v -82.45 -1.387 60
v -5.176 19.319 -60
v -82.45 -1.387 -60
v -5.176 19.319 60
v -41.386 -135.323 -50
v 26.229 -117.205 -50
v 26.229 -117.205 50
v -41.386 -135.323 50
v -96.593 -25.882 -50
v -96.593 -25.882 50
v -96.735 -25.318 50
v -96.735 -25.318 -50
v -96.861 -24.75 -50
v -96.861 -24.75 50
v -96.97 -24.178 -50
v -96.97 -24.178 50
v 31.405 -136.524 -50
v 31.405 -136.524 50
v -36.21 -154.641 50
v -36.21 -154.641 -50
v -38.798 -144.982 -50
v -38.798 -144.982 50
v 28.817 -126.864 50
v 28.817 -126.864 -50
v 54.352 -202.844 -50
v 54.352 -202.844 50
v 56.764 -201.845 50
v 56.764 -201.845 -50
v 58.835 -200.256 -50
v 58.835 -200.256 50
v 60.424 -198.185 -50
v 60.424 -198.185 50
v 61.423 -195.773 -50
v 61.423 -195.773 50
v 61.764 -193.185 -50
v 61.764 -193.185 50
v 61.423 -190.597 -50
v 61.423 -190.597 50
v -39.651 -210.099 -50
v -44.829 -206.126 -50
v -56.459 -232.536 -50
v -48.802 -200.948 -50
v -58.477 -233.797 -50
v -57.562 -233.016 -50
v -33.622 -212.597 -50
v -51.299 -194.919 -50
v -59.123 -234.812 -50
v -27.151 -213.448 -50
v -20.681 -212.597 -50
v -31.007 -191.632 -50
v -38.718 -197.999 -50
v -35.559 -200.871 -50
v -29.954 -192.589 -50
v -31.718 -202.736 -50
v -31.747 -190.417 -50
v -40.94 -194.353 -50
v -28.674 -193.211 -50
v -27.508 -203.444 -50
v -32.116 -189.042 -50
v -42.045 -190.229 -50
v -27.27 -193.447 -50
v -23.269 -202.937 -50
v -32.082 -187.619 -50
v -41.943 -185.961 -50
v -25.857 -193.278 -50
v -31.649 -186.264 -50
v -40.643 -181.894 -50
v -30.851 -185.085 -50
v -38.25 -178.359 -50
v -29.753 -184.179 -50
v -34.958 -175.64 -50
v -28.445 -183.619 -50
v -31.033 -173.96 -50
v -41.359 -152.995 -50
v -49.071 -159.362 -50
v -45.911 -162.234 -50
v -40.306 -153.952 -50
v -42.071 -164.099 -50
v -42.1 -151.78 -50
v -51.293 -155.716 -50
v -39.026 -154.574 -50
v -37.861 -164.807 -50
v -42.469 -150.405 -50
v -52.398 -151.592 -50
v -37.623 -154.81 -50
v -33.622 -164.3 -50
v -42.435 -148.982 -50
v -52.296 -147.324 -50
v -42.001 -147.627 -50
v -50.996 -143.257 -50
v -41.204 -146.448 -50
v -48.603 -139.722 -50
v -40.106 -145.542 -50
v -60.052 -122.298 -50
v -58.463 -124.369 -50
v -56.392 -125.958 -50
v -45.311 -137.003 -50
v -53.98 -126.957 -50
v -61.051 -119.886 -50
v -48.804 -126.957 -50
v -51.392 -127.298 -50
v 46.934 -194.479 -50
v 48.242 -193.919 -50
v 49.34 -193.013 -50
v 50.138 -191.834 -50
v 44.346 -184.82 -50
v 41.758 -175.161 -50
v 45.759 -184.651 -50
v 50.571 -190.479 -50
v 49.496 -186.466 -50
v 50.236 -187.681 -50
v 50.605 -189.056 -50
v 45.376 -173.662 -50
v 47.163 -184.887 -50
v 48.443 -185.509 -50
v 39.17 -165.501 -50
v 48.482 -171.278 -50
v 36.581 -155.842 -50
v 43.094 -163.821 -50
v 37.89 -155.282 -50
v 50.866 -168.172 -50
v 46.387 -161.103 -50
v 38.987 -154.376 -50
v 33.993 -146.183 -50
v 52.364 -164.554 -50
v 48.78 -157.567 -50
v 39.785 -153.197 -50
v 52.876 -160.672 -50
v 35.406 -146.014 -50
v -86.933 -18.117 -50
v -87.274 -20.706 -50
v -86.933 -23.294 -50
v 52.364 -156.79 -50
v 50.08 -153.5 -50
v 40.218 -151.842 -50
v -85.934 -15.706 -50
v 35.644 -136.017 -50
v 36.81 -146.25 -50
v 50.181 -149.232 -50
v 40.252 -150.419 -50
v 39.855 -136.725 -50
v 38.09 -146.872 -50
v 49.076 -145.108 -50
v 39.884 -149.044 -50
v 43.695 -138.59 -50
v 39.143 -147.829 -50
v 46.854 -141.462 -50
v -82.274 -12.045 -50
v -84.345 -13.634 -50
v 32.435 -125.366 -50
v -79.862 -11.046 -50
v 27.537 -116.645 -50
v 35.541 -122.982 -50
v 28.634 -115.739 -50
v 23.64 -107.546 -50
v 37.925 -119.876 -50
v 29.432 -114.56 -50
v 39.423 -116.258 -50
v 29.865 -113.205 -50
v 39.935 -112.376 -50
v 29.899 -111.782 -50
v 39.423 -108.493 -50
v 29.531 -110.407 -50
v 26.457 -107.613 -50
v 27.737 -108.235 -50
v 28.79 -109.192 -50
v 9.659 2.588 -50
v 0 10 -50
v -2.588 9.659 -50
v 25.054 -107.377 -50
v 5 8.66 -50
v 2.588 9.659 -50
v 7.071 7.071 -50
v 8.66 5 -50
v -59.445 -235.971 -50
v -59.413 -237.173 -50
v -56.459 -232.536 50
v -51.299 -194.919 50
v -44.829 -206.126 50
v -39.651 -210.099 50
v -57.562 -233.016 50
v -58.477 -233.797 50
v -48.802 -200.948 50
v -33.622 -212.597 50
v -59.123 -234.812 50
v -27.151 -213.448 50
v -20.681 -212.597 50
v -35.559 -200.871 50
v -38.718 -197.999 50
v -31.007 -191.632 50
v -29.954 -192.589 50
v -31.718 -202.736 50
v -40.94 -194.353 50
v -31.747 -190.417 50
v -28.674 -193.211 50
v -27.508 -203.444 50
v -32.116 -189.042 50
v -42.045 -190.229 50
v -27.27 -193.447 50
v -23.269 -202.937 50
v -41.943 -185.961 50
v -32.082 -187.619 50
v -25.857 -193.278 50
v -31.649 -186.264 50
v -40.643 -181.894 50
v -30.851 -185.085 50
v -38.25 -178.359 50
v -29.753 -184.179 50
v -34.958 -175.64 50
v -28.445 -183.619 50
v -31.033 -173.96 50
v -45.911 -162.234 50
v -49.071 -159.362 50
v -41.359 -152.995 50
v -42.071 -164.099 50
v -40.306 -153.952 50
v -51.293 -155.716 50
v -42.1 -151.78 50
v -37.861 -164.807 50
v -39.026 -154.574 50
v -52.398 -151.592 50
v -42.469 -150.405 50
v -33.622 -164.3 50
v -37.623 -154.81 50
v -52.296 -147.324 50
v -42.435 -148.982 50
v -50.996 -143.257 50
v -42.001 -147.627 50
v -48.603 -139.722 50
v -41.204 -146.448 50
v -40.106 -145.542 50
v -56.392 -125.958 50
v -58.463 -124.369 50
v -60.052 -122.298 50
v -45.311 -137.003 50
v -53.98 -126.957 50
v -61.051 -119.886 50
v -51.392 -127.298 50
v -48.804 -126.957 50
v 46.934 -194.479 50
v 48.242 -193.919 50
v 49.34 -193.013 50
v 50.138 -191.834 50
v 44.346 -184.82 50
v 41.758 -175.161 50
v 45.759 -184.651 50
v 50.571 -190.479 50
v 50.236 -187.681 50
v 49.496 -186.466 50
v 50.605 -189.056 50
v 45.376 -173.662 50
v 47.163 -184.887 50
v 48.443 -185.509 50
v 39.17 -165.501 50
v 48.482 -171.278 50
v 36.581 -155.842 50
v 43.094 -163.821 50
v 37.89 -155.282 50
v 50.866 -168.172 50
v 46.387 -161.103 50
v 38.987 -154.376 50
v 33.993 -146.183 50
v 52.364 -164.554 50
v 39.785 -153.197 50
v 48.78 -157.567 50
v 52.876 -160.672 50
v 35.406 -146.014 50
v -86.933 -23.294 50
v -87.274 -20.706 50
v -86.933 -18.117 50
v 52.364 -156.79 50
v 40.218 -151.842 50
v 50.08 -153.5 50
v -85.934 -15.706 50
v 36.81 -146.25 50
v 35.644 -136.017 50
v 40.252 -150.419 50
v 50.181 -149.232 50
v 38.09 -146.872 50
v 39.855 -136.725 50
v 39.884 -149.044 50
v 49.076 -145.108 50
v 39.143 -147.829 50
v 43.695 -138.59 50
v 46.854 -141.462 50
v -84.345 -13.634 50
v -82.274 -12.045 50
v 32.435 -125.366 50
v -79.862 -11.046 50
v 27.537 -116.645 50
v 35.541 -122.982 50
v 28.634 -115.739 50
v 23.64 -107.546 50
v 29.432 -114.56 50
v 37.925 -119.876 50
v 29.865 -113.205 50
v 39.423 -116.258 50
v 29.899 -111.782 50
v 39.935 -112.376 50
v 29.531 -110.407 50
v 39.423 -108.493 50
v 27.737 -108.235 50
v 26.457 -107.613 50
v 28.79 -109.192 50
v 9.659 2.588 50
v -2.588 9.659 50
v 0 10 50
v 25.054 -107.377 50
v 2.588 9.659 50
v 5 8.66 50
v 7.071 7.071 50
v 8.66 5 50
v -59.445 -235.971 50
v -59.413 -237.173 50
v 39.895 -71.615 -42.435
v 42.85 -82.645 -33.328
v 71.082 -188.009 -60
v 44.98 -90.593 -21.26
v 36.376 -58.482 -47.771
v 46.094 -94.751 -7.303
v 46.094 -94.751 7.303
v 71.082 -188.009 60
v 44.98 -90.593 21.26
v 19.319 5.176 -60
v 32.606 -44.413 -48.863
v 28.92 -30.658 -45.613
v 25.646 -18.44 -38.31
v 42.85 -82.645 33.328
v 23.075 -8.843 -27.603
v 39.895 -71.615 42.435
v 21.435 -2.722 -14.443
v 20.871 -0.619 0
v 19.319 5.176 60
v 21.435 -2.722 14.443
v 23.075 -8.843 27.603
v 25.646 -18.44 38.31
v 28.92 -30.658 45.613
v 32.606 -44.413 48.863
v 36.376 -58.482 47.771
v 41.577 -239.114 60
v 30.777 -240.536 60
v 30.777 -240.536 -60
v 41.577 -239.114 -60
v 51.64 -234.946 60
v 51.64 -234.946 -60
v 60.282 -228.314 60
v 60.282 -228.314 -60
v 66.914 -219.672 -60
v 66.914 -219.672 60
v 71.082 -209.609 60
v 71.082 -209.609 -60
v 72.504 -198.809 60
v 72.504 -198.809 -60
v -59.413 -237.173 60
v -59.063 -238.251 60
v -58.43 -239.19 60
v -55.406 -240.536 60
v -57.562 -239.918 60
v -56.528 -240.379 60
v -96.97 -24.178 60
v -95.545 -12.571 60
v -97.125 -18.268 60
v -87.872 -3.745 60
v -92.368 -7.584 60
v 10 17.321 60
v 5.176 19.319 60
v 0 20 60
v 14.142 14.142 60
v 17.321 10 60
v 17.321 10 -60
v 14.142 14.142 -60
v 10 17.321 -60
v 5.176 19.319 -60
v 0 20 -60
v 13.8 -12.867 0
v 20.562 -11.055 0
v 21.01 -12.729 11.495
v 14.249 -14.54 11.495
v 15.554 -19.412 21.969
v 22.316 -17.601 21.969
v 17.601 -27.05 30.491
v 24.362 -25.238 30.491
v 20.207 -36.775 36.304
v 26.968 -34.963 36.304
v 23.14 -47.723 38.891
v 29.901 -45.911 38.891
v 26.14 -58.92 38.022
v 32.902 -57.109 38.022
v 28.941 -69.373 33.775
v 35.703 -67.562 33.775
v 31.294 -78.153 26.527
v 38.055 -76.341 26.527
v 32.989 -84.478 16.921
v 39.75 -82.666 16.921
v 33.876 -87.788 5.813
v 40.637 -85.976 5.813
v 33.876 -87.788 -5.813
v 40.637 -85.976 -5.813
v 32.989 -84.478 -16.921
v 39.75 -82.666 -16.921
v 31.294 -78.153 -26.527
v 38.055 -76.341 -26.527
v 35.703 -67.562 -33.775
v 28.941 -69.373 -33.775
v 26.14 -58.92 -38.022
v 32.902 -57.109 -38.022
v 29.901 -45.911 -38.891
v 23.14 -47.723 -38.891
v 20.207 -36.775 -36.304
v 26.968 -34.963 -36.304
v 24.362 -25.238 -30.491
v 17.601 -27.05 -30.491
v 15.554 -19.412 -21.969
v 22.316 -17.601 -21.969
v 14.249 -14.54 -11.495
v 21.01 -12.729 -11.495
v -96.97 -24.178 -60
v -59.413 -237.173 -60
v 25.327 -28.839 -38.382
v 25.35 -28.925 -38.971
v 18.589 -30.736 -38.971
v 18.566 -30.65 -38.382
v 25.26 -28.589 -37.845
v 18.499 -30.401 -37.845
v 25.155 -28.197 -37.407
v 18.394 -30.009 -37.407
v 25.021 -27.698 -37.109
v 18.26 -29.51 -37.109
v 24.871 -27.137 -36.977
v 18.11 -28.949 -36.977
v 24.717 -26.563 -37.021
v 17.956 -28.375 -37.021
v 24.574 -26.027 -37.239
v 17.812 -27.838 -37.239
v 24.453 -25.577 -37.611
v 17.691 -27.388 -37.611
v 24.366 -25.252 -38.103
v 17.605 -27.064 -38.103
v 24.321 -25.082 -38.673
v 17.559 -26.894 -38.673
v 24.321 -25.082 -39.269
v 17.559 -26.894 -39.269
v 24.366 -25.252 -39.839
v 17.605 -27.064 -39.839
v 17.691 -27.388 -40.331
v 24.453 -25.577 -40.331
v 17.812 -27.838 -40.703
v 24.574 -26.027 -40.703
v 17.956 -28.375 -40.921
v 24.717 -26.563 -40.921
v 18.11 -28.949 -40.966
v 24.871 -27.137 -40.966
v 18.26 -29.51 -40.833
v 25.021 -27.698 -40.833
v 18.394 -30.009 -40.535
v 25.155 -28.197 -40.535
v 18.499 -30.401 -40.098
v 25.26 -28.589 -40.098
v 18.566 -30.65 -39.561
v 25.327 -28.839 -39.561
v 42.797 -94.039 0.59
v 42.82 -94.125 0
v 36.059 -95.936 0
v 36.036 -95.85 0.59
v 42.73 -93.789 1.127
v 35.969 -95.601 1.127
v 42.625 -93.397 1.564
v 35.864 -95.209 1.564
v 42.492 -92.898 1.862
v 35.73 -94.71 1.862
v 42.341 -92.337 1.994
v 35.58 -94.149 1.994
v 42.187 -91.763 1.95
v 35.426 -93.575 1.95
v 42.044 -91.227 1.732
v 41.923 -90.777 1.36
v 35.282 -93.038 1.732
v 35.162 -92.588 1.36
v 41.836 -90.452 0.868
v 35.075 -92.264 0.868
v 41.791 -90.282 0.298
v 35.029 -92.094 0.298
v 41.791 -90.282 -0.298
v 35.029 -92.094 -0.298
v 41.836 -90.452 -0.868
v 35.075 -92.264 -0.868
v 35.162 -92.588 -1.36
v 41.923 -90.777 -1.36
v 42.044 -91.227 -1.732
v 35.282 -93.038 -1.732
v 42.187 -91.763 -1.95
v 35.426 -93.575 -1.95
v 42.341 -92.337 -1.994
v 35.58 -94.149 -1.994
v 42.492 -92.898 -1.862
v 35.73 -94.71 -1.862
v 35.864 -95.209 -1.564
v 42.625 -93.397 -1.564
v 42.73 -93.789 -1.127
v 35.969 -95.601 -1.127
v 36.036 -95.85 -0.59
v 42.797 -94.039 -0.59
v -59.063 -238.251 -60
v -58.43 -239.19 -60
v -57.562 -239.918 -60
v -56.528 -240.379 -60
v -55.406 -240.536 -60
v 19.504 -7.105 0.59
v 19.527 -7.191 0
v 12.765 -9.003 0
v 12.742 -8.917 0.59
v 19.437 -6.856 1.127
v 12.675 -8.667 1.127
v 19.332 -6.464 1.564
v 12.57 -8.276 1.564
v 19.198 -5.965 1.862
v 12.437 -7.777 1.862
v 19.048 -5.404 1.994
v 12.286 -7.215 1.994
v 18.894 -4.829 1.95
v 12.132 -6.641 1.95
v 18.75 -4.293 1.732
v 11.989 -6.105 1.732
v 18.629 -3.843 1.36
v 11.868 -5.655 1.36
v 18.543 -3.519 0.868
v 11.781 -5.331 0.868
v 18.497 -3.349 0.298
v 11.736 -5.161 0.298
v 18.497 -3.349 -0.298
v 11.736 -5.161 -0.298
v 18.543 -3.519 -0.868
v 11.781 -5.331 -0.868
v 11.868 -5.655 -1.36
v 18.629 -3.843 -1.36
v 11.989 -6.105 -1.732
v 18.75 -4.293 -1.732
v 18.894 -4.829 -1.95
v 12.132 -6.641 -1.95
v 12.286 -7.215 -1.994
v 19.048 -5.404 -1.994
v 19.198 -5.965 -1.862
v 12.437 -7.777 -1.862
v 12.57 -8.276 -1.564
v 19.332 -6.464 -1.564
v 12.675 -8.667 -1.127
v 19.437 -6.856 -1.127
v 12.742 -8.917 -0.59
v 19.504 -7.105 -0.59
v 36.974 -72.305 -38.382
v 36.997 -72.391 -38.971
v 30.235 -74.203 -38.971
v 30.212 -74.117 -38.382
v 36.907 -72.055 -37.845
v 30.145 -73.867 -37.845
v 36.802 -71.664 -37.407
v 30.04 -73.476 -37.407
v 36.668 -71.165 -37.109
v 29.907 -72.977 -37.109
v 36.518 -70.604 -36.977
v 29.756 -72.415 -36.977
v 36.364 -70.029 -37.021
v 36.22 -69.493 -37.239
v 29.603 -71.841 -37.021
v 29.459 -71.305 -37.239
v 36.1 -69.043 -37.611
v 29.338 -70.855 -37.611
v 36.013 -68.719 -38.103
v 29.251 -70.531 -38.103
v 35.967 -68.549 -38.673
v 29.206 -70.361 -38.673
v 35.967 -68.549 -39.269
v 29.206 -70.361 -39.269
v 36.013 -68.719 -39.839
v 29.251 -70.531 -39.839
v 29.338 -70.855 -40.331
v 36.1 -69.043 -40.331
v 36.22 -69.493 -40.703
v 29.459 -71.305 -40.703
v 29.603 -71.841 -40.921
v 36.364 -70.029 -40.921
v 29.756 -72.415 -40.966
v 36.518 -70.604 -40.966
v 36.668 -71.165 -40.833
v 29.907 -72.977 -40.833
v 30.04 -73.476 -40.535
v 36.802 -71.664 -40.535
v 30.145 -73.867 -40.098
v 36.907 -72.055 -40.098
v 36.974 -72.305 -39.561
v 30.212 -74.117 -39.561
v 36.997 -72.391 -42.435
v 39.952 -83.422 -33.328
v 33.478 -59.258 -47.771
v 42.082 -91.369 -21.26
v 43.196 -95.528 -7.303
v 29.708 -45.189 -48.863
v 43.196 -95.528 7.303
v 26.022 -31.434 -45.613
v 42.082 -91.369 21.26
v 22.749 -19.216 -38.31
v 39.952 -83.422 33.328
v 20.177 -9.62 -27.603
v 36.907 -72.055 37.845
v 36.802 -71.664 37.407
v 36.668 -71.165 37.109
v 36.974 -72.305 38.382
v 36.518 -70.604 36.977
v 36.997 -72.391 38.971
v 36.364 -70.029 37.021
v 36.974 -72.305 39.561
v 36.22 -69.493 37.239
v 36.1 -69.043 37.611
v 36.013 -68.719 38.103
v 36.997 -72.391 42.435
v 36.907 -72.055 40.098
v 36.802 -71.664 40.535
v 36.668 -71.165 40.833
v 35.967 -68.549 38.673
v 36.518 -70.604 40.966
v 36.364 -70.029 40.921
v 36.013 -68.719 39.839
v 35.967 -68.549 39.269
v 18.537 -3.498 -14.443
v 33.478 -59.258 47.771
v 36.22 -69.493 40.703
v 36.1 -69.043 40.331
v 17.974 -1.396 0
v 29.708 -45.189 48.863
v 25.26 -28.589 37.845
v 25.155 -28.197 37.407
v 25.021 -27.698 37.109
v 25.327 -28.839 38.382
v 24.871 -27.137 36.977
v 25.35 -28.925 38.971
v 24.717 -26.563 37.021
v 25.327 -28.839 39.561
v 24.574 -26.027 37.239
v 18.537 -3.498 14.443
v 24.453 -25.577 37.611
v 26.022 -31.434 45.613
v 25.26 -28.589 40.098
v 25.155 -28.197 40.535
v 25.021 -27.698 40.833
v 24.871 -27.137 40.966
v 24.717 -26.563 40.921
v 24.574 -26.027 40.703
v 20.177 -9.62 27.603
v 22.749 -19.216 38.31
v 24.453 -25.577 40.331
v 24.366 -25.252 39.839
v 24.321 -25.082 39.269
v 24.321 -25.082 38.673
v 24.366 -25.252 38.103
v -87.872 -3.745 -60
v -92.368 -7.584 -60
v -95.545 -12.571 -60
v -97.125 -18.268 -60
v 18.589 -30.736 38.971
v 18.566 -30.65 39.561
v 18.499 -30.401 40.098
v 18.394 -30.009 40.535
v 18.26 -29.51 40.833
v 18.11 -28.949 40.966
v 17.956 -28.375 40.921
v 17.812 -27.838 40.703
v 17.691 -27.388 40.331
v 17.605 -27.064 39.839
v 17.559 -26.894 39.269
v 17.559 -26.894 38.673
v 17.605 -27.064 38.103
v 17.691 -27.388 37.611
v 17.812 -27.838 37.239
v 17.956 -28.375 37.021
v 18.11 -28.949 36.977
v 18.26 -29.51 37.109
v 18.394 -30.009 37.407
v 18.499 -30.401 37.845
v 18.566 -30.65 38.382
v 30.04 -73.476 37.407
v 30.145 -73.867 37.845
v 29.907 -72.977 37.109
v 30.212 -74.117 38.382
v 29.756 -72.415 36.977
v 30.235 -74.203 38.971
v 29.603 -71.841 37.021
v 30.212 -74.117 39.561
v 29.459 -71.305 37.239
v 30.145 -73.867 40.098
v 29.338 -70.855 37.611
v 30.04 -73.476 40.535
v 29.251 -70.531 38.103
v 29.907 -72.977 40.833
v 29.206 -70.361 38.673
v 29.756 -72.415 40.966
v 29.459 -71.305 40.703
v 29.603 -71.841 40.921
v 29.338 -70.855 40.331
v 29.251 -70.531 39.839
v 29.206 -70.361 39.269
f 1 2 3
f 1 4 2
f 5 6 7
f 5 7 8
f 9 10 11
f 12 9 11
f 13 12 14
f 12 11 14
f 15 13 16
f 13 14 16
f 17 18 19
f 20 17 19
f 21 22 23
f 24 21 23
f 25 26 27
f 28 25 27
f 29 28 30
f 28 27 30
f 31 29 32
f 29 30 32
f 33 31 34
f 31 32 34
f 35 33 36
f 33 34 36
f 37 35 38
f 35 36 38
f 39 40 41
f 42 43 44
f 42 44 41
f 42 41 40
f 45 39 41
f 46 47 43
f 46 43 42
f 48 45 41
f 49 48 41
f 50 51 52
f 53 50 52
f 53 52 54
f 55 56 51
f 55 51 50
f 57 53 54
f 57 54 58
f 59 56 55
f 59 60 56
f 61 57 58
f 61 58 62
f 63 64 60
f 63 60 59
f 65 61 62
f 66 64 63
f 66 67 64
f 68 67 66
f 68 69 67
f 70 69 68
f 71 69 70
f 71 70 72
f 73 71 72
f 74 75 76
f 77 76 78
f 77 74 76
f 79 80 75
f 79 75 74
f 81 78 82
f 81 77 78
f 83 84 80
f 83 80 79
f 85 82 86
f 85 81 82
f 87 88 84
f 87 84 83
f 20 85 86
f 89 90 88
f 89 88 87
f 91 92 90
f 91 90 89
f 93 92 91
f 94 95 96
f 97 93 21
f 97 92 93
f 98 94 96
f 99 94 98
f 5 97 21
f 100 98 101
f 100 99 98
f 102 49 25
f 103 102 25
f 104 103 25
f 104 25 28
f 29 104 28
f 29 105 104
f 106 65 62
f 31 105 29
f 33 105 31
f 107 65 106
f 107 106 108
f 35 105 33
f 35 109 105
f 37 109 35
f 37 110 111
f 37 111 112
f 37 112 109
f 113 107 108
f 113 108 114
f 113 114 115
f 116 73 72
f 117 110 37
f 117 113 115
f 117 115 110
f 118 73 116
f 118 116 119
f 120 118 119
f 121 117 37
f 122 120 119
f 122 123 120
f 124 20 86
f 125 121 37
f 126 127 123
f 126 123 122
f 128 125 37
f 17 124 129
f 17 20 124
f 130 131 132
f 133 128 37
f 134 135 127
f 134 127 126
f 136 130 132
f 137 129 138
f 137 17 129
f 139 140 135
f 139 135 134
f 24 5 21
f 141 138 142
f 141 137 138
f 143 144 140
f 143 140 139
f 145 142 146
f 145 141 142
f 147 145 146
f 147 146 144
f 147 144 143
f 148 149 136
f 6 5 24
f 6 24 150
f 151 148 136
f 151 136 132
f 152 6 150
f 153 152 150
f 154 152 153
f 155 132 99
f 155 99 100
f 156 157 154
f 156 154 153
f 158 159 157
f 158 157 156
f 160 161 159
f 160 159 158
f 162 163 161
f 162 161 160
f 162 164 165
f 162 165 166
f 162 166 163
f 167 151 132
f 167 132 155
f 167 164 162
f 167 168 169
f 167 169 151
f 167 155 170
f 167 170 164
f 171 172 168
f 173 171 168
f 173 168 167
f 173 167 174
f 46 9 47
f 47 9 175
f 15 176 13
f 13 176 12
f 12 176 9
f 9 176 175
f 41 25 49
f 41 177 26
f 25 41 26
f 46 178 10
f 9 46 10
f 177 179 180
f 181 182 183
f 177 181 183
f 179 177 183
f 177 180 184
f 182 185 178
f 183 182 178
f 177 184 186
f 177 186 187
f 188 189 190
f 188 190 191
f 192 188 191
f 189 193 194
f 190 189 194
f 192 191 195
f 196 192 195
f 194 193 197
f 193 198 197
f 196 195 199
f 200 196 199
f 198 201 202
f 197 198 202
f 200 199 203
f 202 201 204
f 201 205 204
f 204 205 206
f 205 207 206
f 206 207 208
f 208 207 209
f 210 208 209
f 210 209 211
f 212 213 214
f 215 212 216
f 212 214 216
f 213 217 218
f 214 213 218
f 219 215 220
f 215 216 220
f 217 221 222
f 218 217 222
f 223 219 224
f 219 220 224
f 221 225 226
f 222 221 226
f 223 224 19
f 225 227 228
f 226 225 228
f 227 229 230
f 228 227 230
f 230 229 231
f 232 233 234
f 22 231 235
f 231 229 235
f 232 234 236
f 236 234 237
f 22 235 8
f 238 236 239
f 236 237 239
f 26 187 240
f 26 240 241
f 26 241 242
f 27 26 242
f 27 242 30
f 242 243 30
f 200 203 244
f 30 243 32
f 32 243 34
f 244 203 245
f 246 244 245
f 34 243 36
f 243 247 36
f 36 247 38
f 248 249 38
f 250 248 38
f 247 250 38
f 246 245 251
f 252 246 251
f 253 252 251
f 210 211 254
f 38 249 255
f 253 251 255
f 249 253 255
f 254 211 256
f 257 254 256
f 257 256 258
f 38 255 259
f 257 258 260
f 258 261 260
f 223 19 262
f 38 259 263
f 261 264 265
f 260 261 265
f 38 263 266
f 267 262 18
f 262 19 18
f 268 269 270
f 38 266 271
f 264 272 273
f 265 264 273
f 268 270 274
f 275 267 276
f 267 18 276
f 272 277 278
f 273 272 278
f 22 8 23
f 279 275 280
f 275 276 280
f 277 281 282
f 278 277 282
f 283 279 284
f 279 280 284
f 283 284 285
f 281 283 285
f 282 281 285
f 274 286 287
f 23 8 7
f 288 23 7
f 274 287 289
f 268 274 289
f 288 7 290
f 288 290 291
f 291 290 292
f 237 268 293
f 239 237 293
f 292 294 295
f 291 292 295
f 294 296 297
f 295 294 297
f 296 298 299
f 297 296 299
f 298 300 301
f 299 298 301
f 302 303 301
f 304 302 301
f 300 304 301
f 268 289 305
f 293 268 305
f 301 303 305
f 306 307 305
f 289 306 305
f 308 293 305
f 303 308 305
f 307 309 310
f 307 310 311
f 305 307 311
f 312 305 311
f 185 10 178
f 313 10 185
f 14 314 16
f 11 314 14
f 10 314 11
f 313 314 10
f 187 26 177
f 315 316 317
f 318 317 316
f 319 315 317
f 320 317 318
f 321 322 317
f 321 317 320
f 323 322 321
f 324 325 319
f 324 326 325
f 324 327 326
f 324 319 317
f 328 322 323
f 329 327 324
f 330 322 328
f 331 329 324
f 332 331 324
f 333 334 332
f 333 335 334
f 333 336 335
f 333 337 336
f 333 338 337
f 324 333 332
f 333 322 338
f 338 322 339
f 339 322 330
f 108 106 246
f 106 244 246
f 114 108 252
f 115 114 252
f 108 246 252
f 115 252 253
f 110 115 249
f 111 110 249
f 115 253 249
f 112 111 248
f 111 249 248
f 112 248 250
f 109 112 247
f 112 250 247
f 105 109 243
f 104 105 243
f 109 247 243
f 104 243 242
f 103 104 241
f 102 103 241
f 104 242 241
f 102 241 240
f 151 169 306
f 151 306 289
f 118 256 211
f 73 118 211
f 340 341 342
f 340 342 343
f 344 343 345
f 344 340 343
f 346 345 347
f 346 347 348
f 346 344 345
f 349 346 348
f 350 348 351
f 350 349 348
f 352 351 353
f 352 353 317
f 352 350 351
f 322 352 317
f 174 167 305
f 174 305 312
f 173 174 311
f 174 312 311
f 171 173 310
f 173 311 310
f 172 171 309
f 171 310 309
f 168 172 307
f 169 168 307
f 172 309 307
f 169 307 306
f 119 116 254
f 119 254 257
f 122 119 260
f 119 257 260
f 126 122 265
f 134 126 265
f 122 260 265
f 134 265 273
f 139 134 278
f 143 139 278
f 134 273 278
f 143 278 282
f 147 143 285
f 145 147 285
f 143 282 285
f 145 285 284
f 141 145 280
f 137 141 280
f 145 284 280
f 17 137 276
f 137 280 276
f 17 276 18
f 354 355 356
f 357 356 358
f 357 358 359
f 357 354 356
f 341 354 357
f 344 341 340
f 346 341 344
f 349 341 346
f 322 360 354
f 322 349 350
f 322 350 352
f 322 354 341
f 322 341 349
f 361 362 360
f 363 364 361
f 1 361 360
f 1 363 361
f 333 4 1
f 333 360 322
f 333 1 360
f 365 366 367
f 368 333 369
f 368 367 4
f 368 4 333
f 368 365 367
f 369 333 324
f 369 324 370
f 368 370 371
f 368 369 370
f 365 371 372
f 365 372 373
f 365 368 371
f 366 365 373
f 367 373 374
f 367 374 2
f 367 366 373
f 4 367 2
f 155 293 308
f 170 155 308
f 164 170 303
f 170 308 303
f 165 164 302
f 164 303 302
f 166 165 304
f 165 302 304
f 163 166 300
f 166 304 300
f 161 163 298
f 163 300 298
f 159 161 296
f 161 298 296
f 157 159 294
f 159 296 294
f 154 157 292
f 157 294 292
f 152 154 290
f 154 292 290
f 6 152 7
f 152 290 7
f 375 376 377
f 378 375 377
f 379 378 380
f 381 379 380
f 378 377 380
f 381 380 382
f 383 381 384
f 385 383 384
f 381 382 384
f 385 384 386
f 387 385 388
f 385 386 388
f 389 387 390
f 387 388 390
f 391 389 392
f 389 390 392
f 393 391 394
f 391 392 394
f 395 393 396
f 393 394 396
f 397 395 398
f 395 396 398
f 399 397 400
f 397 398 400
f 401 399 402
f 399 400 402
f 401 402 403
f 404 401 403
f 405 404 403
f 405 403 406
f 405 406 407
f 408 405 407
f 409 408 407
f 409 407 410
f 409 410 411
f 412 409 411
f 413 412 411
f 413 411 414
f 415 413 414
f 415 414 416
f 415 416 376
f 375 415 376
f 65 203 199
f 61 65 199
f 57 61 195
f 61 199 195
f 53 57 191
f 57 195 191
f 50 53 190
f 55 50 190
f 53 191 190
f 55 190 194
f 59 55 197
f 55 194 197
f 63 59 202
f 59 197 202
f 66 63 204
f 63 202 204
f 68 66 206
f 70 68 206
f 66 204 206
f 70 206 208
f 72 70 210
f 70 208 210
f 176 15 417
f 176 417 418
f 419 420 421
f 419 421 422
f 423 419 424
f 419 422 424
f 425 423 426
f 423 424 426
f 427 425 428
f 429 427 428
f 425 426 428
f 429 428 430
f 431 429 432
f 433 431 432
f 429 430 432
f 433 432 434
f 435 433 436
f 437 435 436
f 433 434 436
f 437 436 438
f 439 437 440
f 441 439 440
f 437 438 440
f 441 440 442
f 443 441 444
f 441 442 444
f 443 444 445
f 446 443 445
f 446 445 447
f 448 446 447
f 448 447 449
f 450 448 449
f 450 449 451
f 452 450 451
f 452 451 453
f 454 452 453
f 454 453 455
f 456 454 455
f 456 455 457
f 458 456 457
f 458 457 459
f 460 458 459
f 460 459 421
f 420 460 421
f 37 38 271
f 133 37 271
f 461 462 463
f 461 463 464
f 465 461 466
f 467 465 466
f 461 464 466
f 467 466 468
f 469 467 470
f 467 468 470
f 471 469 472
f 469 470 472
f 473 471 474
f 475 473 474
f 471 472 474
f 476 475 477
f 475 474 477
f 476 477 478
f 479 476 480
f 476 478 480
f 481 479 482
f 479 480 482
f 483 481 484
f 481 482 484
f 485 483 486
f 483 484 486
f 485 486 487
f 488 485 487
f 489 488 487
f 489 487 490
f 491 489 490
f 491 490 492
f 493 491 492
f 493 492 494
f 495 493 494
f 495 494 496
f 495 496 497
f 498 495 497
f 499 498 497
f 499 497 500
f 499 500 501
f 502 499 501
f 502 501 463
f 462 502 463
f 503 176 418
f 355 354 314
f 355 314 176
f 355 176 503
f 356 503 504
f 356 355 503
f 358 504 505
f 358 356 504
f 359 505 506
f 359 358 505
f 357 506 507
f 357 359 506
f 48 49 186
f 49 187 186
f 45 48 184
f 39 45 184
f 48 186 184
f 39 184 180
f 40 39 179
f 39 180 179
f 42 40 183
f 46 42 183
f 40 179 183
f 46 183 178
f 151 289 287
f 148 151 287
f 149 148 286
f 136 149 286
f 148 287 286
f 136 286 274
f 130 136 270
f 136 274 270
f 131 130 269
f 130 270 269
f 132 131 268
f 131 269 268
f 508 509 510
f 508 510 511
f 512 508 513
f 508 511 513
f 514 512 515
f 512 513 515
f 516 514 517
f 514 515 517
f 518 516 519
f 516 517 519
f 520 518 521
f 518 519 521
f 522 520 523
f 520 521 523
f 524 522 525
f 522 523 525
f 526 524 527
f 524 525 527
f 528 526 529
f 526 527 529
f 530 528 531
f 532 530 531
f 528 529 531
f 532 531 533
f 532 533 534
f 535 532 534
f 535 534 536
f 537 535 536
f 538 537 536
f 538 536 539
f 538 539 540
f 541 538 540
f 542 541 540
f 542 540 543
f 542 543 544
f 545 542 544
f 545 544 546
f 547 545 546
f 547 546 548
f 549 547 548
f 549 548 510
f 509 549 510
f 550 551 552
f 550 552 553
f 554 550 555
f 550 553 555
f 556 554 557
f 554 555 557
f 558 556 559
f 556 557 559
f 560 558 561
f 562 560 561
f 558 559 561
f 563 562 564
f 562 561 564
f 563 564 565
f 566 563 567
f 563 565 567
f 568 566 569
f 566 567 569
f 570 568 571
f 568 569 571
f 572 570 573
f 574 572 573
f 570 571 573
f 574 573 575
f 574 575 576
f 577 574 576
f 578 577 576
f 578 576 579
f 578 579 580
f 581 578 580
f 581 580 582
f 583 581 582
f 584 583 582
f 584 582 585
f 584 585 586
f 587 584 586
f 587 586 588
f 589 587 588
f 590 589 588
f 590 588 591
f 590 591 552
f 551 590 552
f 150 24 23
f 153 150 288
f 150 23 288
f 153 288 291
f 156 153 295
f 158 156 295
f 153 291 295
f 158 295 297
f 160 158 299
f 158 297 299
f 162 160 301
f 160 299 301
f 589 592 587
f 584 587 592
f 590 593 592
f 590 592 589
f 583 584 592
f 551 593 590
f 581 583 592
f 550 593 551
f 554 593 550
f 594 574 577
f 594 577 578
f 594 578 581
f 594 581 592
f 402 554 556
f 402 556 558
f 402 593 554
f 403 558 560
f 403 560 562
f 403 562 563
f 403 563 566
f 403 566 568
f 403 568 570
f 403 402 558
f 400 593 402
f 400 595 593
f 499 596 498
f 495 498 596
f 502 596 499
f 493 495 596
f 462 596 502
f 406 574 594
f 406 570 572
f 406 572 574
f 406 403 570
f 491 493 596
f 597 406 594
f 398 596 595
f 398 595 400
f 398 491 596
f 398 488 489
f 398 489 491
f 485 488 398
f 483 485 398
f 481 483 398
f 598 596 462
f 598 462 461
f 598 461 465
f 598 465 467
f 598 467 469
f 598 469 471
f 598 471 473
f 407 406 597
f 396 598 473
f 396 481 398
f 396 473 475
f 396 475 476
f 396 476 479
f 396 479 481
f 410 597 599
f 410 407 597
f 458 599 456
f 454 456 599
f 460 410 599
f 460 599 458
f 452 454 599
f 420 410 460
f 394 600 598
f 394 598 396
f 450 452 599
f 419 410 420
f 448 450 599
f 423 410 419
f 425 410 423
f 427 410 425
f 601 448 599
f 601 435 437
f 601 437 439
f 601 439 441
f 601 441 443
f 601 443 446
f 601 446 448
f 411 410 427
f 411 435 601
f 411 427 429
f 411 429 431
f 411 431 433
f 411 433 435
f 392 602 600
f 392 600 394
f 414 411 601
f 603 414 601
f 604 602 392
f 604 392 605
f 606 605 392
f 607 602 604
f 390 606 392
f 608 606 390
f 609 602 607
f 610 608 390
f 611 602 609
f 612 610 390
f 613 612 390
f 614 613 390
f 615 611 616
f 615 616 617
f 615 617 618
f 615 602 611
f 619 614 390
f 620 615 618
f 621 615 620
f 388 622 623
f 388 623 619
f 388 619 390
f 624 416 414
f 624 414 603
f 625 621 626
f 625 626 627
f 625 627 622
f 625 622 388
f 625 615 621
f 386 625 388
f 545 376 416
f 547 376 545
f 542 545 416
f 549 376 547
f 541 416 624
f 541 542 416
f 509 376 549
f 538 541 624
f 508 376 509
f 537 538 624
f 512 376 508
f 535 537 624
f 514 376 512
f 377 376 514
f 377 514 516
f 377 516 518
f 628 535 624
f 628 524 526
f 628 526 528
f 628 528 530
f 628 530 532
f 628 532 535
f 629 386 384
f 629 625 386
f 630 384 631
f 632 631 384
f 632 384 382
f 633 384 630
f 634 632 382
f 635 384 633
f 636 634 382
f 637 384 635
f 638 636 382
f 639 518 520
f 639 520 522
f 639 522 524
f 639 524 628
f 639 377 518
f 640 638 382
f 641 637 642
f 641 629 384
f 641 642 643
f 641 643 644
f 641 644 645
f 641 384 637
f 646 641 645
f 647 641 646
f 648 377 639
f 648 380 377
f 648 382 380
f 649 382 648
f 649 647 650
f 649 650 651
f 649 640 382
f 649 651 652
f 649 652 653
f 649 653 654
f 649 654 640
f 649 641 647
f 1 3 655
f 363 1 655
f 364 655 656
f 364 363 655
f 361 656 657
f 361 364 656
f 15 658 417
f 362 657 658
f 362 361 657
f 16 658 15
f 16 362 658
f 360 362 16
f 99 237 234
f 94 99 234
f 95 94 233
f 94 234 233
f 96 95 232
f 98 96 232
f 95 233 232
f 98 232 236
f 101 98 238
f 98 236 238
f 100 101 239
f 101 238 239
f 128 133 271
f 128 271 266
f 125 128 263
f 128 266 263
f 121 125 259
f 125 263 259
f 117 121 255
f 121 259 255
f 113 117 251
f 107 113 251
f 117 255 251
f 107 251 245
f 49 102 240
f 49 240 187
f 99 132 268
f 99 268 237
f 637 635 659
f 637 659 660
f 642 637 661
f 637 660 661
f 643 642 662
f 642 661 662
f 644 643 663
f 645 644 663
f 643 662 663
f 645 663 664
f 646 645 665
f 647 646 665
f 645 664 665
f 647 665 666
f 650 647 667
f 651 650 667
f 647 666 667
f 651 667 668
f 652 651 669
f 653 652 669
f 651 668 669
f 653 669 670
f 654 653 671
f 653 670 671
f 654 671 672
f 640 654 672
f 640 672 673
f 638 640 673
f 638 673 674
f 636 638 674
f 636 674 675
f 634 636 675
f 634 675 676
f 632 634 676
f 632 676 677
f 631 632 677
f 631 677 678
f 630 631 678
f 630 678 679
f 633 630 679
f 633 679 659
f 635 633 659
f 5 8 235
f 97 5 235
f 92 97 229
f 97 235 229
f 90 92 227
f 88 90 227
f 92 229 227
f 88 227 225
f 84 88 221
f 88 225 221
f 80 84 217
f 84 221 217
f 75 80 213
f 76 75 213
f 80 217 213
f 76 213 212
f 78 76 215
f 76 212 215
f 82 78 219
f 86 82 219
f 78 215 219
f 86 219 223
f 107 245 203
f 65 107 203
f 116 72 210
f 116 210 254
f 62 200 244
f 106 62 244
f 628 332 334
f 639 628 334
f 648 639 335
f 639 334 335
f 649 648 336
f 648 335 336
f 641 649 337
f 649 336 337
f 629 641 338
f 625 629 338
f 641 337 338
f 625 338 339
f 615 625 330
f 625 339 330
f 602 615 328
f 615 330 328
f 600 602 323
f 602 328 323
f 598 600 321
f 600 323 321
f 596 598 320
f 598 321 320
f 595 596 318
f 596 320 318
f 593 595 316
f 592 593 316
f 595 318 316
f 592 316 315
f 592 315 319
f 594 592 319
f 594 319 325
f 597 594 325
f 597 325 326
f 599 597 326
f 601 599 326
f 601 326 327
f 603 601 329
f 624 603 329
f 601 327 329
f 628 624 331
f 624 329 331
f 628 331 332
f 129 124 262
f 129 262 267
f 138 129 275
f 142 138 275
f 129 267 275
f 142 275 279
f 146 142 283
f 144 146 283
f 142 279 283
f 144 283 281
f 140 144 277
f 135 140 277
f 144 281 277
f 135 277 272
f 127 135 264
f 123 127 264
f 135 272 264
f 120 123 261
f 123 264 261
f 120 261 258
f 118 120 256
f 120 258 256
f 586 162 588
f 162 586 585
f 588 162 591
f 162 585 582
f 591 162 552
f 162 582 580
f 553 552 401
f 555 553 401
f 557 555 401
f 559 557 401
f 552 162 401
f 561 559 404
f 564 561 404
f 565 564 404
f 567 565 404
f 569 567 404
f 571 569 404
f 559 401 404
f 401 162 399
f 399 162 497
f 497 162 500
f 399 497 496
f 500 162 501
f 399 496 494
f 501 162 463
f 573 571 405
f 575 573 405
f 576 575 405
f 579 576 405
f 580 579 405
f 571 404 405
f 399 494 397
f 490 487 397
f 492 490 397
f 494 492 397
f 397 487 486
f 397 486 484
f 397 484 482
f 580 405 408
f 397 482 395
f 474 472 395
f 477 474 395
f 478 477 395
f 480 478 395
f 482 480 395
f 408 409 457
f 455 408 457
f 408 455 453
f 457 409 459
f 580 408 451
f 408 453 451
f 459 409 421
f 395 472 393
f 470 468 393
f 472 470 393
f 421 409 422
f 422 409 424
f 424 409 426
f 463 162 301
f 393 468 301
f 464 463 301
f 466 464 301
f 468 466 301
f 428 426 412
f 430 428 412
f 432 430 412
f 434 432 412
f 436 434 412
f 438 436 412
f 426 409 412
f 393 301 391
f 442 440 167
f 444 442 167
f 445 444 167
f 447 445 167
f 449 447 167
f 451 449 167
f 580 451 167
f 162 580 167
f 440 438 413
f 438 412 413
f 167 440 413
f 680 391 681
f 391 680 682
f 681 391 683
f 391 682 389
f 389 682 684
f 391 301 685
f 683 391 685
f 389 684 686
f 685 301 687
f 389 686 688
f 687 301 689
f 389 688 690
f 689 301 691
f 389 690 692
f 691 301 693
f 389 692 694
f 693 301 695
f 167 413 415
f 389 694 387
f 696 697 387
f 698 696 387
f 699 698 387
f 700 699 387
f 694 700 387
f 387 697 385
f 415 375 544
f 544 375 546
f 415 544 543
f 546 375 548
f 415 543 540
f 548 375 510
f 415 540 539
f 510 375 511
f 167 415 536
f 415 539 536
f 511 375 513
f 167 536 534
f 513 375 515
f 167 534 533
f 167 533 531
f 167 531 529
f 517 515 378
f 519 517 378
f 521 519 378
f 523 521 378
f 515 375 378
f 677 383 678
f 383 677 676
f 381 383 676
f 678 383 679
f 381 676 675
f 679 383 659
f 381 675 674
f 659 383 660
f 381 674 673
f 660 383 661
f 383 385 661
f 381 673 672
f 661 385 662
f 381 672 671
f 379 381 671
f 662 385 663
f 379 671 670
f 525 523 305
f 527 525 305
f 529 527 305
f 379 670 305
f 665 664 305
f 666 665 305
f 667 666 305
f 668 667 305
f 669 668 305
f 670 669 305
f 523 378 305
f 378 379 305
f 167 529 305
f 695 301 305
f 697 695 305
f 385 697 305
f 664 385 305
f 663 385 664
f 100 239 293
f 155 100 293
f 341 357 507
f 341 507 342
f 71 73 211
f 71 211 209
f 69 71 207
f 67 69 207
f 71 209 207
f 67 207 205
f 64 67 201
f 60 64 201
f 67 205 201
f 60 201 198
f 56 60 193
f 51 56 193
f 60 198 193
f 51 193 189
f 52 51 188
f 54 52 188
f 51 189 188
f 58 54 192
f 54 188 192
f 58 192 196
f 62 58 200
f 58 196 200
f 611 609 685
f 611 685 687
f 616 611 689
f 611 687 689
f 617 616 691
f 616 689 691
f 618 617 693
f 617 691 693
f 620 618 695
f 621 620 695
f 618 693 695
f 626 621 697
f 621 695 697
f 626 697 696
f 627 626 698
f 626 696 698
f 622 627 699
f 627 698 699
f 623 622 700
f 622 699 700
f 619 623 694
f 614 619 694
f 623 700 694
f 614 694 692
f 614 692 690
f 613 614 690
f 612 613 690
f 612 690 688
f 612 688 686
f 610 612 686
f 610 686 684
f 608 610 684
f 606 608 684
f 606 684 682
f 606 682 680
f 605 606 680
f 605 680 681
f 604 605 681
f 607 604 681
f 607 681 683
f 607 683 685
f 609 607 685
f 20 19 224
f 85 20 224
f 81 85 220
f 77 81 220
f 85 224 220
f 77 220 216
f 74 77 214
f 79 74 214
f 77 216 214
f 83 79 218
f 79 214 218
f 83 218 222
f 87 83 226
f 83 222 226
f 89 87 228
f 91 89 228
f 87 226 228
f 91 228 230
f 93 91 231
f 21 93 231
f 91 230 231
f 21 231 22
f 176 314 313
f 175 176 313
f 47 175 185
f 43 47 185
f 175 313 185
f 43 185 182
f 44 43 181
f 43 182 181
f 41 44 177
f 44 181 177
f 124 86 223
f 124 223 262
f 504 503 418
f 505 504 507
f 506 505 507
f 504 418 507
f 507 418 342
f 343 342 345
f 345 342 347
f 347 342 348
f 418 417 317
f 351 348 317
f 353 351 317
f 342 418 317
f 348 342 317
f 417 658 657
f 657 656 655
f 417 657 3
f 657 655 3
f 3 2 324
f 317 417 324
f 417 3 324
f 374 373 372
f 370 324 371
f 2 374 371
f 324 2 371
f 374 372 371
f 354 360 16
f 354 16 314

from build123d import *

# Parameters (mm, degrees)
F1_DEPTH = 60
F2_DEPTH = 50
F3_R     = 39
F4_DEPTH = 10
F3_R_2   = 49
F5_DEPTH = 3
F6_D     = 4
F6_DEPTH = 20
F6_TIP   = 1.2017212381


with BuildPart() as f1:
    # F0 (on Top) → F1 (new body, symmetric)
    with BuildSketch(Plane.XY):
        with BuildLine():
            ThreePointArc((-20.6806279512, -212.5965936405), (-39.6511040787, -210.0990830779), (-51.299249736, -194.9189241108))
            Line((-51.299249736, -194.9189241108), (-96.5925826289, -25.8819045103))
            ThreePointArc((-96.5925826289, -25.8819045103), (-96.7999862455, -25.034315887), (-96.9702211634, -24.1784871615))
            Line((-96.9702211634, -24.1784871615), (-59.4134556551, -237.1734885924))
            ThreePointArc((-59.4134556551, -237.1734885924), (-58.8379861015, -234.2804077793), (-56.4591683744, -232.5361864574))
            Line((-56.4591683744, -232.5361864574), (54.3519994715, -202.8444235207))
            ThreePointArc((54.3519994715, -202.8444235207), (60.4240630584, -198.1851652578), (61.4230672834, -190.5969748068))
            Line((61.4230672834, -190.5969748068), (52.3644007048, -156.7895708867))
            ThreePointArc((52.3644007048, -156.7895708867), (50.8658943672, -168.1718565632), (41.757798987, -175.1607439575))
            Line((41.757798987, -175.1607439575), (-25.8570088532, -193.2780771147))
            ThreePointArc((-25.8570088532, -193.2780771147), (-31.9807332102, -189.7425432088), (-28.4451993043, -183.6188188518))
            Line((-28.4451993043, -183.6188188518), (39.169608536, -165.5014856947))
            ThreePointArc((39.169608536, -165.5014856947), (49.7762102538, -147.1303126238), (31.4050371829, -136.523710906))
            Line((31.4050371829, -136.523710906), (-36.2097706573, -154.6410440632))
            ThreePointArc((-36.2097706573, -154.6410440632), (-42.3334950143, -151.1055101572), (-38.7979611084, -144.9817858003))
            Line((-38.7979611084, -144.9817858003), (28.8168467319, -126.8644526431))
            ThreePointArc((28.8168467319, -126.8644526431), (37.9249421121, -119.8755652488), (39.4234484497, -108.4932795722))
            Line((39.4234484497, -108.4932795722), (9.6592582629, 2.588190451))
            ThreePointArc((9.6592582629, 2.588190451), (5, 8.6602540378), (-2.588190451, 9.6592582629))
            Line((-2.588190451, 9.6592582629), (-79.8622565541, -11.0462653453))
            ThreePointArc((-79.8622565541, -11.0462653453), (-85.934320141, -15.7055236082), (-86.933324366, -23.2937140592))
            Line((-86.933324366, -23.2937140592), (-61.0514198558, -119.8862966881))
            ThreePointArc((-61.0514198558, -119.8862966881), (-56.3921615929, -125.958360275), (-48.8039711418, -126.9573645))
            Line((-48.8039711418, -126.9573645), (23.6404658298, -107.5459361173))
            ThreePointArc((23.6404658298, -107.5459361173), (29.7641901868, -111.0814700232), (26.2286562809, -117.2051943802))
            Line((26.2286562809, -117.2051943802), (-41.3861515594, -135.3225275374))
            ThreePointArc((-41.3861515594, -135.3225275374), (-51.9927532772, -153.6937006083), (-33.6215802063, -164.300302326))
            Line((-33.6215802063, -164.300302326), (33.9932276339, -146.1829691689))
            ThreePointArc((33.9932276339, -146.1829691689), (40.1169519909, -149.7185030748), (36.581418085, -155.8422274318))
            Line((36.581418085, -155.8422274318), (-31.0333897553, -173.9595605889))
            ThreePointArc((-31.0333897553, -173.9595605889), (-41.6399914731, -192.3307336598), (-23.2688184022, -202.9373353776))
            Line((-23.2688184022, -202.9373353776), (44.345989438, -184.8200022204))
            ThreePointArc((44.345989438, -184.8200022204), (50.469713795, -188.3555361264), (46.9341798891, -194.4792604833))
            Line((46.9341798891, -194.4792604833), (-20.6806279512, -212.5965936405))
        make_face()
        with BuildLine():
            Line((-96.5925826289, -25.8819045103), (-51.299249736, -194.9189241108))
            ThreePointArc((-51.299249736, -194.9189241108), (-39.6511040787, -210.0990830779), (-20.6806279512, -212.5965936405))
            Line((-20.6806279512, -212.5965936405), (46.9341798891, -194.4792604833))
            ThreePointArc((46.9341798891, -194.4792604833), (50.469713795, -188.3555361264), (44.345989438, -184.8200022204))
            Line((44.345989438, -184.8200022204), (-23.2688184022, -202.9373353776))
            ThreePointArc((-23.2688184022, -202.9373353776), (-41.6399914731, -192.3307336598), (-31.0333897553, -173.9595605889))
            Line((-31.0333897553, -173.9595605889), (36.581418085, -155.8422274318))
            ThreePointArc((36.581418085, -155.8422274318), (40.1169519909, -149.7185030748), (33.9932276339, -146.1829691689))
            Line((33.9932276339, -146.1829691689), (-33.6215802063, -164.300302326))
            ThreePointArc((-33.6215802063, -164.300302326), (-51.9927532772, -153.6937006083), (-41.3861515594, -135.3225275374))
            Line((-41.3861515594, -135.3225275374), (26.2286562809, -117.2051943802))
            ThreePointArc((26.2286562809, -117.2051943802), (29.7641901868, -111.0814700232), (23.6404658298, -107.5459361173))
            Line((23.6404658298, -107.5459361173), (-48.8039711418, -126.9573645))
            ThreePointArc((-48.8039711418, -126.9573645), (-56.3921615929, -125.958360275), (-61.0514198558, -119.8862966881))
            Line((-61.0514198558, -119.8862966881), (-86.933324366, -23.2937140592))
            ThreePointArc((-86.933324366, -23.2937140592), (-85.934320141, -15.7055236082), (-79.8622565541, -11.0462653453))
            Line((-79.8622565541, -11.0462653453), (-2.588190451, 9.6592582629))
            ThreePointArc((-2.588190451, 9.6592582629), (5, 8.6602540378), (9.6592582629, 2.588190451))
            Line((9.6592582629, 2.588190451), (39.4234484497, -108.4932795722))
            ThreePointArc((39.4234484497, -108.4932795722), (37.9249421121, -119.8755652488), (28.8168467319, -126.8644526431))
            Line((28.8168467319, -126.8644526431), (-38.7979611084, -144.9817858003))
            ThreePointArc((-38.7979611084, -144.9817858003), (-42.3334950143, -151.1055101572), (-36.2097706573, -154.6410440632))
            Line((-36.2097706573, -154.6410440632), (31.4050371829, -136.523710906))
            ThreePointArc((31.4050371829, -136.523710906), (49.7762102538, -147.1303126238), (39.169608536, -165.5014856947))
            Line((39.169608536, -165.5014856947), (-28.4451993043, -183.6188188518))
            ThreePointArc((-28.4451993043, -183.6188188518), (-31.9807332102, -189.7425432088), (-25.8570088532, -193.2780771147))
            Line((-25.8570088532, -193.2780771147), (41.757798987, -175.1607439575))
            ThreePointArc((41.757798987, -175.1607439575), (50.8658943672, -168.1718565632), (52.3644007048, -156.7895708867))
            Line((52.3644007048, -156.7895708867), (61.4230672834, -190.5969748068))
            ThreePointArc((61.4230672834, -190.5969748068), (60.4240630584, -198.1851652578), (54.3519994715, -202.8444235207))
            Line((54.3519994715, -202.8444235207), (-56.4591683744, -232.5361864574))
            ThreePointArc((-56.4591683744, -232.5361864574), (-58.8379861015, -234.2804077793), (-59.4134556551, -237.1734885924))
            ThreePointArc((-59.4134556551, -237.1734885924), (-58.0216629892, -239.5841442033), (-55.4059483937, -240.5361864574))
            Line((-55.4059483937, -240.5361864574), (30.7766323053, -240.5361864574))
            ThreePointArc((30.7766323053, -240.5361864574), (63.8813029697, -224.210769539), (71.0823255463, -188.0087843558))
            Line((71.0823255463, -188.0087843558), (19.3185165258, 5.1763809021))
            ThreePointArc((19.3185165258, 5.1763809021), (10, 17.3205080757), (-5.1763809021, 19.3185165258))
            Line((-5.1763809021, 19.3185165258), (-82.4504470052, -1.3870070824))
            ThreePointArc((-82.4504470052, -1.3870070824), (-94.1418950194, -9.9595314413), (-96.9702211634, -24.1784871615))
            ThreePointArc((-96.9702211634, -24.1784871615), (-96.7999862455, -25.034315887), (-96.5925826289, -25.8819045103))
        make_face()
    extrude(amount=F1_DEPTH, both=True)

    # F0 (on Top) → F2 (cut, symmetric)
    with BuildSketch(Plane.XY):
        with BuildLine():
            ThreePointArc((-20.6806279512, -212.5965936405), (-39.6511040787, -210.0990830779), (-51.299249736, -194.9189241108))
            Line((-51.299249736, -194.9189241108), (-96.5925826289, -25.8819045103))
            ThreePointArc((-96.5925826289, -25.8819045103), (-96.7999862455, -25.034315887), (-96.9702211634, -24.1784871615))
            Line((-96.9702211634, -24.1784871615), (-59.4134556551, -237.1734885924))
            ThreePointArc((-59.4134556551, -237.1734885924), (-58.8379861015, -234.2804077793), (-56.4591683744, -232.5361864574))
            Line((-56.4591683744, -232.5361864574), (54.3519994715, -202.8444235207))
            ThreePointArc((54.3519994715, -202.8444235207), (60.4240630584, -198.1851652578), (61.4230672834, -190.5969748068))
            Line((61.4230672834, -190.5969748068), (52.3644007048, -156.7895708867))
            ThreePointArc((52.3644007048, -156.7895708867), (50.8658943672, -168.1718565632), (41.757798987, -175.1607439575))
            Line((41.757798987, -175.1607439575), (-25.8570088532, -193.2780771147))
            ThreePointArc((-25.8570088532, -193.2780771147), (-31.9807332102, -189.7425432088), (-28.4451993043, -183.6188188518))
            Line((-28.4451993043, -183.6188188518), (39.169608536, -165.5014856947))
            ThreePointArc((39.169608536, -165.5014856947), (49.7762102538, -147.1303126238), (31.4050371829, -136.523710906))
            Line((31.4050371829, -136.523710906), (-36.2097706573, -154.6410440632))
            ThreePointArc((-36.2097706573, -154.6410440632), (-42.3334950143, -151.1055101572), (-38.7979611084, -144.9817858003))
            Line((-38.7979611084, -144.9817858003), (28.8168467319, -126.8644526431))
            ThreePointArc((28.8168467319, -126.8644526431), (37.9249421121, -119.8755652488), (39.4234484497, -108.4932795722))
            Line((39.4234484497, -108.4932795722), (9.6592582629, 2.588190451))
            ThreePointArc((9.6592582629, 2.588190451), (5, 8.6602540378), (-2.588190451, 9.6592582629))
            Line((-2.588190451, 9.6592582629), (-79.8622565541, -11.0462653453))
            ThreePointArc((-79.8622565541, -11.0462653453), (-85.934320141, -15.7055236082), (-86.933324366, -23.2937140592))
            Line((-86.933324366, -23.2937140592), (-61.0514198558, -119.8862966881))
            ThreePointArc((-61.0514198558, -119.8862966881), (-56.3921615929, -125.958360275), (-48.8039711418, -126.9573645))
            Line((-48.8039711418, -126.9573645), (23.6404658298, -107.5459361173))
            ThreePointArc((23.6404658298, -107.5459361173), (29.7641901868, -111.0814700232), (26.2286562809, -117.2051943802))
            Line((26.2286562809, -117.2051943802), (-41.3861515594, -135.3225275374))
            ThreePointArc((-41.3861515594, -135.3225275374), (-51.9927532772, -153.6937006083), (-33.6215802063, -164.300302326))
            Line((-33.6215802063, -164.300302326), (33.9932276339, -146.1829691689))
            ThreePointArc((33.9932276339, -146.1829691689), (40.1169519909, -149.7185030748), (36.581418085, -155.8422274318))
            Line((36.581418085, -155.8422274318), (-31.0333897553, -173.9595605889))
            ThreePointArc((-31.0333897553, -173.9595605889), (-41.6399914731, -192.3307336598), (-23.2688184022, -202.9373353776))
            Line((-23.2688184022, -202.9373353776), (44.345989438, -184.8200022204))
            ThreePointArc((44.345989438, -184.8200022204), (50.469713795, -188.3555361264), (46.9341798891, -194.4792604833))
            Line((46.9341798891, -194.4792604833), (-20.6806279512, -212.5965936405))
        make_face()
    extrude(amount=F2_DEPTH, both=True, mode=Mode.SUBTRACT)

    # F3 (on face) → F4 (cut)
    with BuildSketch(Plane(origin=(19.3185165258, 5.1763809021, 0), x_dir=(-0.2588190451, 0.9659258263, 0), z_dir=(0.9659258263, 0.2588190451, 0))):
        with Locations((-55, 0)):
            Circle(F3_R)
    extrude(amount=-F4_DEPTH, mode=Mode.SUBTRACT)

    # F3 (on face) → F5 (cut)
    with BuildSketch(Plane(origin=(19.3185165258, 5.1763809021, 0), x_dir=(-0.2588190451, 0.9659258263, 0), z_dir=(0.9659258263, 0.2588190451, 0))):
        with Locations((-55, 0)):
            Circle(F3_R_2)
        with Locations((-55, 0)):
            Circle(F3_R, mode=Mode.SUBTRACT)
    extrude(amount=-F5_DEPTH, mode=Mode.SUBTRACT)

    # F6
    with Locations(Plane(origin=(19.3185165258, 5.1763809021, 0), x_dir=(-0.2588190451, 0.9659258263, 0), z_dir=(0.9659258263, 0.2588190451, 0))):
        with Locations((-10, 0), (-32.5, -38.9711431703), (-77.5, -38.9711431703), (-100, 0), (-77.5, 38.9711431703), (-32.5, 38.9711431703)):
            Hole(F6_D / 2, depth=F6_DEPTH)
            with Locations((0, 0, -(F6_DEPTH + F6_TIP / 2))):  # 118° drill point
                Cone(0, F6_D / 2, F6_TIP, mode=Mode.SUBTRACT)


solid = f1.part
